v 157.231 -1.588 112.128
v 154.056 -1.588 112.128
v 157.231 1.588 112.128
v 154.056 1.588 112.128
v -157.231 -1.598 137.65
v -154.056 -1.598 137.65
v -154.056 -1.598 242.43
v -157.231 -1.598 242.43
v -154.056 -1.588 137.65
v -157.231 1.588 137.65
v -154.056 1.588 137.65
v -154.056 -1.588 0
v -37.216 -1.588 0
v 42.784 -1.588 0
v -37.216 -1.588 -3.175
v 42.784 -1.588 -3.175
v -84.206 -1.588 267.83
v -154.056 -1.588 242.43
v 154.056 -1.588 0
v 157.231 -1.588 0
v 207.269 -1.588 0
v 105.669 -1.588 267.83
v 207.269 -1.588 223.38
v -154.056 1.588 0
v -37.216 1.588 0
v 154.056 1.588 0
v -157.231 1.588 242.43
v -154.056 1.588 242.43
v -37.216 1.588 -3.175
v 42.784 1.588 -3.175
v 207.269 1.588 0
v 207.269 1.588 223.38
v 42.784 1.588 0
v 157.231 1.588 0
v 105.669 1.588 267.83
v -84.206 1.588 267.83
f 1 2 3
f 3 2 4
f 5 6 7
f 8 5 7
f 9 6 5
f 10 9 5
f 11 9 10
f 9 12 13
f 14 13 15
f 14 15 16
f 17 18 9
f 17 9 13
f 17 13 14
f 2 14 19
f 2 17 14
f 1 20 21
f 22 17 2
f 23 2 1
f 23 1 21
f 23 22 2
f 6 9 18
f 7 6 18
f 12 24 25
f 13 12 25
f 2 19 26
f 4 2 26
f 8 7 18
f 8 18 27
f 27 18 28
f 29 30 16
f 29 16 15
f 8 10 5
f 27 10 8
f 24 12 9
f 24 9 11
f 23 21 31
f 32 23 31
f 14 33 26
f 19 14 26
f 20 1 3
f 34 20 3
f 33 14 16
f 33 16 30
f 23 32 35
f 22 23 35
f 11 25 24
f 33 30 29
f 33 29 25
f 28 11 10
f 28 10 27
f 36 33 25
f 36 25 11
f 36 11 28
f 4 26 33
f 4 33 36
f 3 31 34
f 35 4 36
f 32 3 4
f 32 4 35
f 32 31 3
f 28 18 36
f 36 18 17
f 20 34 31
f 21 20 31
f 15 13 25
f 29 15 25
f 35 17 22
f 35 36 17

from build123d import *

# Parameters (mm, degrees)
SKETCH1_W           = 308.1112
SKETCH1_H           = 3.175
BOSS_EXTRUDE1_DEPTH = 267.83
SKETCH3_W           = 155.702
SKETCH3_H           = 3.175
BOSS_EXTRUDE3_DEPTH = 3.175
SKETCH4_W           = 50.038
SKETCH4_H           = 3.175
BOSS_EXTRUDE4_DEPTH = 267.83
CUT_EXTRUDE1_DEPTH  = 339.67870035
SKETCH8_W           = 80
SKETCH8_H           = 3.175
BOSS_EXTRUDE6_DEPTH = 3.175
CUT_EXTRUDE3_DEPTH  = 339.67870035
SKETCH13_W          = 104.779999964
SKETCH13_H          = 3.1854967
BOSS_EXTRUDE7_DEPTH = 3.175


with BuildPart() as part:
    # Sketch1 → Boss-Extrude1 (new body)
    with BuildSketch(Plane.XY):
        Rectangle(SKETCH1_W, SKETCH1_H)
    extrude(amount=BOSS_EXTRUDE1_DEPTH)

    # Sketch3 → Boss-Extrude3 (add)
    with BuildSketch(Plane(origin=(154.0556, 0, 0), x_dir=(0, 0, -1), z_dir=(1, 0, 0))):
        with Locations((-189.979, 0)):
            Rectangle(SKETCH3_W, SKETCH3_H)
    extrude(amount=BOSS_EXTRUDE3_DEPTH)

    # Sketch4 → Boss-Extrude4 (add)
    with BuildSketch(Plane.XY.offset(267.83)):
        with Locations((182.2496, 0)):
            Rectangle(SKETCH4_W, SKETCH4_H)
    extrude(amount=-BOSS_EXTRUDE4_DEPTH)

    # Sketch6 → Cut-Extrude1 (cut, through all)
    with BuildSketch(Plane(origin=(0, 1.5875, 0), x_dir=(1, 0, 0), z_dir=(0, 1, 0))):
        Polygon((207.2686, -223.38), (105.6686, -267.83), (207.2686, -267.83), align=None)
    extrude(amount=-CUT_EXTRUDE1_DEPTH, mode=Mode.SUBTRACT)

    # Sketch8 → Boss-Extrude6 (add)
    with BuildSketch(Plane(origin=(0, 0, 0), x_dir=(-1, 0, 0), z_dir=(0, 0, -1))):
        with Locations((-2.78399998, 0)):
            Rectangle(SKETCH8_W, SKETCH8_H)
    extrude(amount=BOSS_EXTRUDE6_DEPTH)

    # Sketch11 → Cut-Extrude3 (cut, through all)
    with BuildSketch(Plane.XZ.offset(1.5875)):
        Polygon((-154.0556, 242.43), (-84.2056, 267.83), (-154.0556, 267.83), align=None)
    extrude(amount=-CUT_EXTRUDE3_DEPTH, mode=Mode.SUBTRACT)

    # Sketch13 → Boss-Extrude7 (add)
    with BuildSketch(Plane.ZY.offset(154.0556)):
        with Locations((190.040000018, -0.00524835)):
            Rectangle(SKETCH13_W, SKETCH13_H)
    extrude(amount=BOSS_EXTRUDE7_DEPTH)


solid = part.part
